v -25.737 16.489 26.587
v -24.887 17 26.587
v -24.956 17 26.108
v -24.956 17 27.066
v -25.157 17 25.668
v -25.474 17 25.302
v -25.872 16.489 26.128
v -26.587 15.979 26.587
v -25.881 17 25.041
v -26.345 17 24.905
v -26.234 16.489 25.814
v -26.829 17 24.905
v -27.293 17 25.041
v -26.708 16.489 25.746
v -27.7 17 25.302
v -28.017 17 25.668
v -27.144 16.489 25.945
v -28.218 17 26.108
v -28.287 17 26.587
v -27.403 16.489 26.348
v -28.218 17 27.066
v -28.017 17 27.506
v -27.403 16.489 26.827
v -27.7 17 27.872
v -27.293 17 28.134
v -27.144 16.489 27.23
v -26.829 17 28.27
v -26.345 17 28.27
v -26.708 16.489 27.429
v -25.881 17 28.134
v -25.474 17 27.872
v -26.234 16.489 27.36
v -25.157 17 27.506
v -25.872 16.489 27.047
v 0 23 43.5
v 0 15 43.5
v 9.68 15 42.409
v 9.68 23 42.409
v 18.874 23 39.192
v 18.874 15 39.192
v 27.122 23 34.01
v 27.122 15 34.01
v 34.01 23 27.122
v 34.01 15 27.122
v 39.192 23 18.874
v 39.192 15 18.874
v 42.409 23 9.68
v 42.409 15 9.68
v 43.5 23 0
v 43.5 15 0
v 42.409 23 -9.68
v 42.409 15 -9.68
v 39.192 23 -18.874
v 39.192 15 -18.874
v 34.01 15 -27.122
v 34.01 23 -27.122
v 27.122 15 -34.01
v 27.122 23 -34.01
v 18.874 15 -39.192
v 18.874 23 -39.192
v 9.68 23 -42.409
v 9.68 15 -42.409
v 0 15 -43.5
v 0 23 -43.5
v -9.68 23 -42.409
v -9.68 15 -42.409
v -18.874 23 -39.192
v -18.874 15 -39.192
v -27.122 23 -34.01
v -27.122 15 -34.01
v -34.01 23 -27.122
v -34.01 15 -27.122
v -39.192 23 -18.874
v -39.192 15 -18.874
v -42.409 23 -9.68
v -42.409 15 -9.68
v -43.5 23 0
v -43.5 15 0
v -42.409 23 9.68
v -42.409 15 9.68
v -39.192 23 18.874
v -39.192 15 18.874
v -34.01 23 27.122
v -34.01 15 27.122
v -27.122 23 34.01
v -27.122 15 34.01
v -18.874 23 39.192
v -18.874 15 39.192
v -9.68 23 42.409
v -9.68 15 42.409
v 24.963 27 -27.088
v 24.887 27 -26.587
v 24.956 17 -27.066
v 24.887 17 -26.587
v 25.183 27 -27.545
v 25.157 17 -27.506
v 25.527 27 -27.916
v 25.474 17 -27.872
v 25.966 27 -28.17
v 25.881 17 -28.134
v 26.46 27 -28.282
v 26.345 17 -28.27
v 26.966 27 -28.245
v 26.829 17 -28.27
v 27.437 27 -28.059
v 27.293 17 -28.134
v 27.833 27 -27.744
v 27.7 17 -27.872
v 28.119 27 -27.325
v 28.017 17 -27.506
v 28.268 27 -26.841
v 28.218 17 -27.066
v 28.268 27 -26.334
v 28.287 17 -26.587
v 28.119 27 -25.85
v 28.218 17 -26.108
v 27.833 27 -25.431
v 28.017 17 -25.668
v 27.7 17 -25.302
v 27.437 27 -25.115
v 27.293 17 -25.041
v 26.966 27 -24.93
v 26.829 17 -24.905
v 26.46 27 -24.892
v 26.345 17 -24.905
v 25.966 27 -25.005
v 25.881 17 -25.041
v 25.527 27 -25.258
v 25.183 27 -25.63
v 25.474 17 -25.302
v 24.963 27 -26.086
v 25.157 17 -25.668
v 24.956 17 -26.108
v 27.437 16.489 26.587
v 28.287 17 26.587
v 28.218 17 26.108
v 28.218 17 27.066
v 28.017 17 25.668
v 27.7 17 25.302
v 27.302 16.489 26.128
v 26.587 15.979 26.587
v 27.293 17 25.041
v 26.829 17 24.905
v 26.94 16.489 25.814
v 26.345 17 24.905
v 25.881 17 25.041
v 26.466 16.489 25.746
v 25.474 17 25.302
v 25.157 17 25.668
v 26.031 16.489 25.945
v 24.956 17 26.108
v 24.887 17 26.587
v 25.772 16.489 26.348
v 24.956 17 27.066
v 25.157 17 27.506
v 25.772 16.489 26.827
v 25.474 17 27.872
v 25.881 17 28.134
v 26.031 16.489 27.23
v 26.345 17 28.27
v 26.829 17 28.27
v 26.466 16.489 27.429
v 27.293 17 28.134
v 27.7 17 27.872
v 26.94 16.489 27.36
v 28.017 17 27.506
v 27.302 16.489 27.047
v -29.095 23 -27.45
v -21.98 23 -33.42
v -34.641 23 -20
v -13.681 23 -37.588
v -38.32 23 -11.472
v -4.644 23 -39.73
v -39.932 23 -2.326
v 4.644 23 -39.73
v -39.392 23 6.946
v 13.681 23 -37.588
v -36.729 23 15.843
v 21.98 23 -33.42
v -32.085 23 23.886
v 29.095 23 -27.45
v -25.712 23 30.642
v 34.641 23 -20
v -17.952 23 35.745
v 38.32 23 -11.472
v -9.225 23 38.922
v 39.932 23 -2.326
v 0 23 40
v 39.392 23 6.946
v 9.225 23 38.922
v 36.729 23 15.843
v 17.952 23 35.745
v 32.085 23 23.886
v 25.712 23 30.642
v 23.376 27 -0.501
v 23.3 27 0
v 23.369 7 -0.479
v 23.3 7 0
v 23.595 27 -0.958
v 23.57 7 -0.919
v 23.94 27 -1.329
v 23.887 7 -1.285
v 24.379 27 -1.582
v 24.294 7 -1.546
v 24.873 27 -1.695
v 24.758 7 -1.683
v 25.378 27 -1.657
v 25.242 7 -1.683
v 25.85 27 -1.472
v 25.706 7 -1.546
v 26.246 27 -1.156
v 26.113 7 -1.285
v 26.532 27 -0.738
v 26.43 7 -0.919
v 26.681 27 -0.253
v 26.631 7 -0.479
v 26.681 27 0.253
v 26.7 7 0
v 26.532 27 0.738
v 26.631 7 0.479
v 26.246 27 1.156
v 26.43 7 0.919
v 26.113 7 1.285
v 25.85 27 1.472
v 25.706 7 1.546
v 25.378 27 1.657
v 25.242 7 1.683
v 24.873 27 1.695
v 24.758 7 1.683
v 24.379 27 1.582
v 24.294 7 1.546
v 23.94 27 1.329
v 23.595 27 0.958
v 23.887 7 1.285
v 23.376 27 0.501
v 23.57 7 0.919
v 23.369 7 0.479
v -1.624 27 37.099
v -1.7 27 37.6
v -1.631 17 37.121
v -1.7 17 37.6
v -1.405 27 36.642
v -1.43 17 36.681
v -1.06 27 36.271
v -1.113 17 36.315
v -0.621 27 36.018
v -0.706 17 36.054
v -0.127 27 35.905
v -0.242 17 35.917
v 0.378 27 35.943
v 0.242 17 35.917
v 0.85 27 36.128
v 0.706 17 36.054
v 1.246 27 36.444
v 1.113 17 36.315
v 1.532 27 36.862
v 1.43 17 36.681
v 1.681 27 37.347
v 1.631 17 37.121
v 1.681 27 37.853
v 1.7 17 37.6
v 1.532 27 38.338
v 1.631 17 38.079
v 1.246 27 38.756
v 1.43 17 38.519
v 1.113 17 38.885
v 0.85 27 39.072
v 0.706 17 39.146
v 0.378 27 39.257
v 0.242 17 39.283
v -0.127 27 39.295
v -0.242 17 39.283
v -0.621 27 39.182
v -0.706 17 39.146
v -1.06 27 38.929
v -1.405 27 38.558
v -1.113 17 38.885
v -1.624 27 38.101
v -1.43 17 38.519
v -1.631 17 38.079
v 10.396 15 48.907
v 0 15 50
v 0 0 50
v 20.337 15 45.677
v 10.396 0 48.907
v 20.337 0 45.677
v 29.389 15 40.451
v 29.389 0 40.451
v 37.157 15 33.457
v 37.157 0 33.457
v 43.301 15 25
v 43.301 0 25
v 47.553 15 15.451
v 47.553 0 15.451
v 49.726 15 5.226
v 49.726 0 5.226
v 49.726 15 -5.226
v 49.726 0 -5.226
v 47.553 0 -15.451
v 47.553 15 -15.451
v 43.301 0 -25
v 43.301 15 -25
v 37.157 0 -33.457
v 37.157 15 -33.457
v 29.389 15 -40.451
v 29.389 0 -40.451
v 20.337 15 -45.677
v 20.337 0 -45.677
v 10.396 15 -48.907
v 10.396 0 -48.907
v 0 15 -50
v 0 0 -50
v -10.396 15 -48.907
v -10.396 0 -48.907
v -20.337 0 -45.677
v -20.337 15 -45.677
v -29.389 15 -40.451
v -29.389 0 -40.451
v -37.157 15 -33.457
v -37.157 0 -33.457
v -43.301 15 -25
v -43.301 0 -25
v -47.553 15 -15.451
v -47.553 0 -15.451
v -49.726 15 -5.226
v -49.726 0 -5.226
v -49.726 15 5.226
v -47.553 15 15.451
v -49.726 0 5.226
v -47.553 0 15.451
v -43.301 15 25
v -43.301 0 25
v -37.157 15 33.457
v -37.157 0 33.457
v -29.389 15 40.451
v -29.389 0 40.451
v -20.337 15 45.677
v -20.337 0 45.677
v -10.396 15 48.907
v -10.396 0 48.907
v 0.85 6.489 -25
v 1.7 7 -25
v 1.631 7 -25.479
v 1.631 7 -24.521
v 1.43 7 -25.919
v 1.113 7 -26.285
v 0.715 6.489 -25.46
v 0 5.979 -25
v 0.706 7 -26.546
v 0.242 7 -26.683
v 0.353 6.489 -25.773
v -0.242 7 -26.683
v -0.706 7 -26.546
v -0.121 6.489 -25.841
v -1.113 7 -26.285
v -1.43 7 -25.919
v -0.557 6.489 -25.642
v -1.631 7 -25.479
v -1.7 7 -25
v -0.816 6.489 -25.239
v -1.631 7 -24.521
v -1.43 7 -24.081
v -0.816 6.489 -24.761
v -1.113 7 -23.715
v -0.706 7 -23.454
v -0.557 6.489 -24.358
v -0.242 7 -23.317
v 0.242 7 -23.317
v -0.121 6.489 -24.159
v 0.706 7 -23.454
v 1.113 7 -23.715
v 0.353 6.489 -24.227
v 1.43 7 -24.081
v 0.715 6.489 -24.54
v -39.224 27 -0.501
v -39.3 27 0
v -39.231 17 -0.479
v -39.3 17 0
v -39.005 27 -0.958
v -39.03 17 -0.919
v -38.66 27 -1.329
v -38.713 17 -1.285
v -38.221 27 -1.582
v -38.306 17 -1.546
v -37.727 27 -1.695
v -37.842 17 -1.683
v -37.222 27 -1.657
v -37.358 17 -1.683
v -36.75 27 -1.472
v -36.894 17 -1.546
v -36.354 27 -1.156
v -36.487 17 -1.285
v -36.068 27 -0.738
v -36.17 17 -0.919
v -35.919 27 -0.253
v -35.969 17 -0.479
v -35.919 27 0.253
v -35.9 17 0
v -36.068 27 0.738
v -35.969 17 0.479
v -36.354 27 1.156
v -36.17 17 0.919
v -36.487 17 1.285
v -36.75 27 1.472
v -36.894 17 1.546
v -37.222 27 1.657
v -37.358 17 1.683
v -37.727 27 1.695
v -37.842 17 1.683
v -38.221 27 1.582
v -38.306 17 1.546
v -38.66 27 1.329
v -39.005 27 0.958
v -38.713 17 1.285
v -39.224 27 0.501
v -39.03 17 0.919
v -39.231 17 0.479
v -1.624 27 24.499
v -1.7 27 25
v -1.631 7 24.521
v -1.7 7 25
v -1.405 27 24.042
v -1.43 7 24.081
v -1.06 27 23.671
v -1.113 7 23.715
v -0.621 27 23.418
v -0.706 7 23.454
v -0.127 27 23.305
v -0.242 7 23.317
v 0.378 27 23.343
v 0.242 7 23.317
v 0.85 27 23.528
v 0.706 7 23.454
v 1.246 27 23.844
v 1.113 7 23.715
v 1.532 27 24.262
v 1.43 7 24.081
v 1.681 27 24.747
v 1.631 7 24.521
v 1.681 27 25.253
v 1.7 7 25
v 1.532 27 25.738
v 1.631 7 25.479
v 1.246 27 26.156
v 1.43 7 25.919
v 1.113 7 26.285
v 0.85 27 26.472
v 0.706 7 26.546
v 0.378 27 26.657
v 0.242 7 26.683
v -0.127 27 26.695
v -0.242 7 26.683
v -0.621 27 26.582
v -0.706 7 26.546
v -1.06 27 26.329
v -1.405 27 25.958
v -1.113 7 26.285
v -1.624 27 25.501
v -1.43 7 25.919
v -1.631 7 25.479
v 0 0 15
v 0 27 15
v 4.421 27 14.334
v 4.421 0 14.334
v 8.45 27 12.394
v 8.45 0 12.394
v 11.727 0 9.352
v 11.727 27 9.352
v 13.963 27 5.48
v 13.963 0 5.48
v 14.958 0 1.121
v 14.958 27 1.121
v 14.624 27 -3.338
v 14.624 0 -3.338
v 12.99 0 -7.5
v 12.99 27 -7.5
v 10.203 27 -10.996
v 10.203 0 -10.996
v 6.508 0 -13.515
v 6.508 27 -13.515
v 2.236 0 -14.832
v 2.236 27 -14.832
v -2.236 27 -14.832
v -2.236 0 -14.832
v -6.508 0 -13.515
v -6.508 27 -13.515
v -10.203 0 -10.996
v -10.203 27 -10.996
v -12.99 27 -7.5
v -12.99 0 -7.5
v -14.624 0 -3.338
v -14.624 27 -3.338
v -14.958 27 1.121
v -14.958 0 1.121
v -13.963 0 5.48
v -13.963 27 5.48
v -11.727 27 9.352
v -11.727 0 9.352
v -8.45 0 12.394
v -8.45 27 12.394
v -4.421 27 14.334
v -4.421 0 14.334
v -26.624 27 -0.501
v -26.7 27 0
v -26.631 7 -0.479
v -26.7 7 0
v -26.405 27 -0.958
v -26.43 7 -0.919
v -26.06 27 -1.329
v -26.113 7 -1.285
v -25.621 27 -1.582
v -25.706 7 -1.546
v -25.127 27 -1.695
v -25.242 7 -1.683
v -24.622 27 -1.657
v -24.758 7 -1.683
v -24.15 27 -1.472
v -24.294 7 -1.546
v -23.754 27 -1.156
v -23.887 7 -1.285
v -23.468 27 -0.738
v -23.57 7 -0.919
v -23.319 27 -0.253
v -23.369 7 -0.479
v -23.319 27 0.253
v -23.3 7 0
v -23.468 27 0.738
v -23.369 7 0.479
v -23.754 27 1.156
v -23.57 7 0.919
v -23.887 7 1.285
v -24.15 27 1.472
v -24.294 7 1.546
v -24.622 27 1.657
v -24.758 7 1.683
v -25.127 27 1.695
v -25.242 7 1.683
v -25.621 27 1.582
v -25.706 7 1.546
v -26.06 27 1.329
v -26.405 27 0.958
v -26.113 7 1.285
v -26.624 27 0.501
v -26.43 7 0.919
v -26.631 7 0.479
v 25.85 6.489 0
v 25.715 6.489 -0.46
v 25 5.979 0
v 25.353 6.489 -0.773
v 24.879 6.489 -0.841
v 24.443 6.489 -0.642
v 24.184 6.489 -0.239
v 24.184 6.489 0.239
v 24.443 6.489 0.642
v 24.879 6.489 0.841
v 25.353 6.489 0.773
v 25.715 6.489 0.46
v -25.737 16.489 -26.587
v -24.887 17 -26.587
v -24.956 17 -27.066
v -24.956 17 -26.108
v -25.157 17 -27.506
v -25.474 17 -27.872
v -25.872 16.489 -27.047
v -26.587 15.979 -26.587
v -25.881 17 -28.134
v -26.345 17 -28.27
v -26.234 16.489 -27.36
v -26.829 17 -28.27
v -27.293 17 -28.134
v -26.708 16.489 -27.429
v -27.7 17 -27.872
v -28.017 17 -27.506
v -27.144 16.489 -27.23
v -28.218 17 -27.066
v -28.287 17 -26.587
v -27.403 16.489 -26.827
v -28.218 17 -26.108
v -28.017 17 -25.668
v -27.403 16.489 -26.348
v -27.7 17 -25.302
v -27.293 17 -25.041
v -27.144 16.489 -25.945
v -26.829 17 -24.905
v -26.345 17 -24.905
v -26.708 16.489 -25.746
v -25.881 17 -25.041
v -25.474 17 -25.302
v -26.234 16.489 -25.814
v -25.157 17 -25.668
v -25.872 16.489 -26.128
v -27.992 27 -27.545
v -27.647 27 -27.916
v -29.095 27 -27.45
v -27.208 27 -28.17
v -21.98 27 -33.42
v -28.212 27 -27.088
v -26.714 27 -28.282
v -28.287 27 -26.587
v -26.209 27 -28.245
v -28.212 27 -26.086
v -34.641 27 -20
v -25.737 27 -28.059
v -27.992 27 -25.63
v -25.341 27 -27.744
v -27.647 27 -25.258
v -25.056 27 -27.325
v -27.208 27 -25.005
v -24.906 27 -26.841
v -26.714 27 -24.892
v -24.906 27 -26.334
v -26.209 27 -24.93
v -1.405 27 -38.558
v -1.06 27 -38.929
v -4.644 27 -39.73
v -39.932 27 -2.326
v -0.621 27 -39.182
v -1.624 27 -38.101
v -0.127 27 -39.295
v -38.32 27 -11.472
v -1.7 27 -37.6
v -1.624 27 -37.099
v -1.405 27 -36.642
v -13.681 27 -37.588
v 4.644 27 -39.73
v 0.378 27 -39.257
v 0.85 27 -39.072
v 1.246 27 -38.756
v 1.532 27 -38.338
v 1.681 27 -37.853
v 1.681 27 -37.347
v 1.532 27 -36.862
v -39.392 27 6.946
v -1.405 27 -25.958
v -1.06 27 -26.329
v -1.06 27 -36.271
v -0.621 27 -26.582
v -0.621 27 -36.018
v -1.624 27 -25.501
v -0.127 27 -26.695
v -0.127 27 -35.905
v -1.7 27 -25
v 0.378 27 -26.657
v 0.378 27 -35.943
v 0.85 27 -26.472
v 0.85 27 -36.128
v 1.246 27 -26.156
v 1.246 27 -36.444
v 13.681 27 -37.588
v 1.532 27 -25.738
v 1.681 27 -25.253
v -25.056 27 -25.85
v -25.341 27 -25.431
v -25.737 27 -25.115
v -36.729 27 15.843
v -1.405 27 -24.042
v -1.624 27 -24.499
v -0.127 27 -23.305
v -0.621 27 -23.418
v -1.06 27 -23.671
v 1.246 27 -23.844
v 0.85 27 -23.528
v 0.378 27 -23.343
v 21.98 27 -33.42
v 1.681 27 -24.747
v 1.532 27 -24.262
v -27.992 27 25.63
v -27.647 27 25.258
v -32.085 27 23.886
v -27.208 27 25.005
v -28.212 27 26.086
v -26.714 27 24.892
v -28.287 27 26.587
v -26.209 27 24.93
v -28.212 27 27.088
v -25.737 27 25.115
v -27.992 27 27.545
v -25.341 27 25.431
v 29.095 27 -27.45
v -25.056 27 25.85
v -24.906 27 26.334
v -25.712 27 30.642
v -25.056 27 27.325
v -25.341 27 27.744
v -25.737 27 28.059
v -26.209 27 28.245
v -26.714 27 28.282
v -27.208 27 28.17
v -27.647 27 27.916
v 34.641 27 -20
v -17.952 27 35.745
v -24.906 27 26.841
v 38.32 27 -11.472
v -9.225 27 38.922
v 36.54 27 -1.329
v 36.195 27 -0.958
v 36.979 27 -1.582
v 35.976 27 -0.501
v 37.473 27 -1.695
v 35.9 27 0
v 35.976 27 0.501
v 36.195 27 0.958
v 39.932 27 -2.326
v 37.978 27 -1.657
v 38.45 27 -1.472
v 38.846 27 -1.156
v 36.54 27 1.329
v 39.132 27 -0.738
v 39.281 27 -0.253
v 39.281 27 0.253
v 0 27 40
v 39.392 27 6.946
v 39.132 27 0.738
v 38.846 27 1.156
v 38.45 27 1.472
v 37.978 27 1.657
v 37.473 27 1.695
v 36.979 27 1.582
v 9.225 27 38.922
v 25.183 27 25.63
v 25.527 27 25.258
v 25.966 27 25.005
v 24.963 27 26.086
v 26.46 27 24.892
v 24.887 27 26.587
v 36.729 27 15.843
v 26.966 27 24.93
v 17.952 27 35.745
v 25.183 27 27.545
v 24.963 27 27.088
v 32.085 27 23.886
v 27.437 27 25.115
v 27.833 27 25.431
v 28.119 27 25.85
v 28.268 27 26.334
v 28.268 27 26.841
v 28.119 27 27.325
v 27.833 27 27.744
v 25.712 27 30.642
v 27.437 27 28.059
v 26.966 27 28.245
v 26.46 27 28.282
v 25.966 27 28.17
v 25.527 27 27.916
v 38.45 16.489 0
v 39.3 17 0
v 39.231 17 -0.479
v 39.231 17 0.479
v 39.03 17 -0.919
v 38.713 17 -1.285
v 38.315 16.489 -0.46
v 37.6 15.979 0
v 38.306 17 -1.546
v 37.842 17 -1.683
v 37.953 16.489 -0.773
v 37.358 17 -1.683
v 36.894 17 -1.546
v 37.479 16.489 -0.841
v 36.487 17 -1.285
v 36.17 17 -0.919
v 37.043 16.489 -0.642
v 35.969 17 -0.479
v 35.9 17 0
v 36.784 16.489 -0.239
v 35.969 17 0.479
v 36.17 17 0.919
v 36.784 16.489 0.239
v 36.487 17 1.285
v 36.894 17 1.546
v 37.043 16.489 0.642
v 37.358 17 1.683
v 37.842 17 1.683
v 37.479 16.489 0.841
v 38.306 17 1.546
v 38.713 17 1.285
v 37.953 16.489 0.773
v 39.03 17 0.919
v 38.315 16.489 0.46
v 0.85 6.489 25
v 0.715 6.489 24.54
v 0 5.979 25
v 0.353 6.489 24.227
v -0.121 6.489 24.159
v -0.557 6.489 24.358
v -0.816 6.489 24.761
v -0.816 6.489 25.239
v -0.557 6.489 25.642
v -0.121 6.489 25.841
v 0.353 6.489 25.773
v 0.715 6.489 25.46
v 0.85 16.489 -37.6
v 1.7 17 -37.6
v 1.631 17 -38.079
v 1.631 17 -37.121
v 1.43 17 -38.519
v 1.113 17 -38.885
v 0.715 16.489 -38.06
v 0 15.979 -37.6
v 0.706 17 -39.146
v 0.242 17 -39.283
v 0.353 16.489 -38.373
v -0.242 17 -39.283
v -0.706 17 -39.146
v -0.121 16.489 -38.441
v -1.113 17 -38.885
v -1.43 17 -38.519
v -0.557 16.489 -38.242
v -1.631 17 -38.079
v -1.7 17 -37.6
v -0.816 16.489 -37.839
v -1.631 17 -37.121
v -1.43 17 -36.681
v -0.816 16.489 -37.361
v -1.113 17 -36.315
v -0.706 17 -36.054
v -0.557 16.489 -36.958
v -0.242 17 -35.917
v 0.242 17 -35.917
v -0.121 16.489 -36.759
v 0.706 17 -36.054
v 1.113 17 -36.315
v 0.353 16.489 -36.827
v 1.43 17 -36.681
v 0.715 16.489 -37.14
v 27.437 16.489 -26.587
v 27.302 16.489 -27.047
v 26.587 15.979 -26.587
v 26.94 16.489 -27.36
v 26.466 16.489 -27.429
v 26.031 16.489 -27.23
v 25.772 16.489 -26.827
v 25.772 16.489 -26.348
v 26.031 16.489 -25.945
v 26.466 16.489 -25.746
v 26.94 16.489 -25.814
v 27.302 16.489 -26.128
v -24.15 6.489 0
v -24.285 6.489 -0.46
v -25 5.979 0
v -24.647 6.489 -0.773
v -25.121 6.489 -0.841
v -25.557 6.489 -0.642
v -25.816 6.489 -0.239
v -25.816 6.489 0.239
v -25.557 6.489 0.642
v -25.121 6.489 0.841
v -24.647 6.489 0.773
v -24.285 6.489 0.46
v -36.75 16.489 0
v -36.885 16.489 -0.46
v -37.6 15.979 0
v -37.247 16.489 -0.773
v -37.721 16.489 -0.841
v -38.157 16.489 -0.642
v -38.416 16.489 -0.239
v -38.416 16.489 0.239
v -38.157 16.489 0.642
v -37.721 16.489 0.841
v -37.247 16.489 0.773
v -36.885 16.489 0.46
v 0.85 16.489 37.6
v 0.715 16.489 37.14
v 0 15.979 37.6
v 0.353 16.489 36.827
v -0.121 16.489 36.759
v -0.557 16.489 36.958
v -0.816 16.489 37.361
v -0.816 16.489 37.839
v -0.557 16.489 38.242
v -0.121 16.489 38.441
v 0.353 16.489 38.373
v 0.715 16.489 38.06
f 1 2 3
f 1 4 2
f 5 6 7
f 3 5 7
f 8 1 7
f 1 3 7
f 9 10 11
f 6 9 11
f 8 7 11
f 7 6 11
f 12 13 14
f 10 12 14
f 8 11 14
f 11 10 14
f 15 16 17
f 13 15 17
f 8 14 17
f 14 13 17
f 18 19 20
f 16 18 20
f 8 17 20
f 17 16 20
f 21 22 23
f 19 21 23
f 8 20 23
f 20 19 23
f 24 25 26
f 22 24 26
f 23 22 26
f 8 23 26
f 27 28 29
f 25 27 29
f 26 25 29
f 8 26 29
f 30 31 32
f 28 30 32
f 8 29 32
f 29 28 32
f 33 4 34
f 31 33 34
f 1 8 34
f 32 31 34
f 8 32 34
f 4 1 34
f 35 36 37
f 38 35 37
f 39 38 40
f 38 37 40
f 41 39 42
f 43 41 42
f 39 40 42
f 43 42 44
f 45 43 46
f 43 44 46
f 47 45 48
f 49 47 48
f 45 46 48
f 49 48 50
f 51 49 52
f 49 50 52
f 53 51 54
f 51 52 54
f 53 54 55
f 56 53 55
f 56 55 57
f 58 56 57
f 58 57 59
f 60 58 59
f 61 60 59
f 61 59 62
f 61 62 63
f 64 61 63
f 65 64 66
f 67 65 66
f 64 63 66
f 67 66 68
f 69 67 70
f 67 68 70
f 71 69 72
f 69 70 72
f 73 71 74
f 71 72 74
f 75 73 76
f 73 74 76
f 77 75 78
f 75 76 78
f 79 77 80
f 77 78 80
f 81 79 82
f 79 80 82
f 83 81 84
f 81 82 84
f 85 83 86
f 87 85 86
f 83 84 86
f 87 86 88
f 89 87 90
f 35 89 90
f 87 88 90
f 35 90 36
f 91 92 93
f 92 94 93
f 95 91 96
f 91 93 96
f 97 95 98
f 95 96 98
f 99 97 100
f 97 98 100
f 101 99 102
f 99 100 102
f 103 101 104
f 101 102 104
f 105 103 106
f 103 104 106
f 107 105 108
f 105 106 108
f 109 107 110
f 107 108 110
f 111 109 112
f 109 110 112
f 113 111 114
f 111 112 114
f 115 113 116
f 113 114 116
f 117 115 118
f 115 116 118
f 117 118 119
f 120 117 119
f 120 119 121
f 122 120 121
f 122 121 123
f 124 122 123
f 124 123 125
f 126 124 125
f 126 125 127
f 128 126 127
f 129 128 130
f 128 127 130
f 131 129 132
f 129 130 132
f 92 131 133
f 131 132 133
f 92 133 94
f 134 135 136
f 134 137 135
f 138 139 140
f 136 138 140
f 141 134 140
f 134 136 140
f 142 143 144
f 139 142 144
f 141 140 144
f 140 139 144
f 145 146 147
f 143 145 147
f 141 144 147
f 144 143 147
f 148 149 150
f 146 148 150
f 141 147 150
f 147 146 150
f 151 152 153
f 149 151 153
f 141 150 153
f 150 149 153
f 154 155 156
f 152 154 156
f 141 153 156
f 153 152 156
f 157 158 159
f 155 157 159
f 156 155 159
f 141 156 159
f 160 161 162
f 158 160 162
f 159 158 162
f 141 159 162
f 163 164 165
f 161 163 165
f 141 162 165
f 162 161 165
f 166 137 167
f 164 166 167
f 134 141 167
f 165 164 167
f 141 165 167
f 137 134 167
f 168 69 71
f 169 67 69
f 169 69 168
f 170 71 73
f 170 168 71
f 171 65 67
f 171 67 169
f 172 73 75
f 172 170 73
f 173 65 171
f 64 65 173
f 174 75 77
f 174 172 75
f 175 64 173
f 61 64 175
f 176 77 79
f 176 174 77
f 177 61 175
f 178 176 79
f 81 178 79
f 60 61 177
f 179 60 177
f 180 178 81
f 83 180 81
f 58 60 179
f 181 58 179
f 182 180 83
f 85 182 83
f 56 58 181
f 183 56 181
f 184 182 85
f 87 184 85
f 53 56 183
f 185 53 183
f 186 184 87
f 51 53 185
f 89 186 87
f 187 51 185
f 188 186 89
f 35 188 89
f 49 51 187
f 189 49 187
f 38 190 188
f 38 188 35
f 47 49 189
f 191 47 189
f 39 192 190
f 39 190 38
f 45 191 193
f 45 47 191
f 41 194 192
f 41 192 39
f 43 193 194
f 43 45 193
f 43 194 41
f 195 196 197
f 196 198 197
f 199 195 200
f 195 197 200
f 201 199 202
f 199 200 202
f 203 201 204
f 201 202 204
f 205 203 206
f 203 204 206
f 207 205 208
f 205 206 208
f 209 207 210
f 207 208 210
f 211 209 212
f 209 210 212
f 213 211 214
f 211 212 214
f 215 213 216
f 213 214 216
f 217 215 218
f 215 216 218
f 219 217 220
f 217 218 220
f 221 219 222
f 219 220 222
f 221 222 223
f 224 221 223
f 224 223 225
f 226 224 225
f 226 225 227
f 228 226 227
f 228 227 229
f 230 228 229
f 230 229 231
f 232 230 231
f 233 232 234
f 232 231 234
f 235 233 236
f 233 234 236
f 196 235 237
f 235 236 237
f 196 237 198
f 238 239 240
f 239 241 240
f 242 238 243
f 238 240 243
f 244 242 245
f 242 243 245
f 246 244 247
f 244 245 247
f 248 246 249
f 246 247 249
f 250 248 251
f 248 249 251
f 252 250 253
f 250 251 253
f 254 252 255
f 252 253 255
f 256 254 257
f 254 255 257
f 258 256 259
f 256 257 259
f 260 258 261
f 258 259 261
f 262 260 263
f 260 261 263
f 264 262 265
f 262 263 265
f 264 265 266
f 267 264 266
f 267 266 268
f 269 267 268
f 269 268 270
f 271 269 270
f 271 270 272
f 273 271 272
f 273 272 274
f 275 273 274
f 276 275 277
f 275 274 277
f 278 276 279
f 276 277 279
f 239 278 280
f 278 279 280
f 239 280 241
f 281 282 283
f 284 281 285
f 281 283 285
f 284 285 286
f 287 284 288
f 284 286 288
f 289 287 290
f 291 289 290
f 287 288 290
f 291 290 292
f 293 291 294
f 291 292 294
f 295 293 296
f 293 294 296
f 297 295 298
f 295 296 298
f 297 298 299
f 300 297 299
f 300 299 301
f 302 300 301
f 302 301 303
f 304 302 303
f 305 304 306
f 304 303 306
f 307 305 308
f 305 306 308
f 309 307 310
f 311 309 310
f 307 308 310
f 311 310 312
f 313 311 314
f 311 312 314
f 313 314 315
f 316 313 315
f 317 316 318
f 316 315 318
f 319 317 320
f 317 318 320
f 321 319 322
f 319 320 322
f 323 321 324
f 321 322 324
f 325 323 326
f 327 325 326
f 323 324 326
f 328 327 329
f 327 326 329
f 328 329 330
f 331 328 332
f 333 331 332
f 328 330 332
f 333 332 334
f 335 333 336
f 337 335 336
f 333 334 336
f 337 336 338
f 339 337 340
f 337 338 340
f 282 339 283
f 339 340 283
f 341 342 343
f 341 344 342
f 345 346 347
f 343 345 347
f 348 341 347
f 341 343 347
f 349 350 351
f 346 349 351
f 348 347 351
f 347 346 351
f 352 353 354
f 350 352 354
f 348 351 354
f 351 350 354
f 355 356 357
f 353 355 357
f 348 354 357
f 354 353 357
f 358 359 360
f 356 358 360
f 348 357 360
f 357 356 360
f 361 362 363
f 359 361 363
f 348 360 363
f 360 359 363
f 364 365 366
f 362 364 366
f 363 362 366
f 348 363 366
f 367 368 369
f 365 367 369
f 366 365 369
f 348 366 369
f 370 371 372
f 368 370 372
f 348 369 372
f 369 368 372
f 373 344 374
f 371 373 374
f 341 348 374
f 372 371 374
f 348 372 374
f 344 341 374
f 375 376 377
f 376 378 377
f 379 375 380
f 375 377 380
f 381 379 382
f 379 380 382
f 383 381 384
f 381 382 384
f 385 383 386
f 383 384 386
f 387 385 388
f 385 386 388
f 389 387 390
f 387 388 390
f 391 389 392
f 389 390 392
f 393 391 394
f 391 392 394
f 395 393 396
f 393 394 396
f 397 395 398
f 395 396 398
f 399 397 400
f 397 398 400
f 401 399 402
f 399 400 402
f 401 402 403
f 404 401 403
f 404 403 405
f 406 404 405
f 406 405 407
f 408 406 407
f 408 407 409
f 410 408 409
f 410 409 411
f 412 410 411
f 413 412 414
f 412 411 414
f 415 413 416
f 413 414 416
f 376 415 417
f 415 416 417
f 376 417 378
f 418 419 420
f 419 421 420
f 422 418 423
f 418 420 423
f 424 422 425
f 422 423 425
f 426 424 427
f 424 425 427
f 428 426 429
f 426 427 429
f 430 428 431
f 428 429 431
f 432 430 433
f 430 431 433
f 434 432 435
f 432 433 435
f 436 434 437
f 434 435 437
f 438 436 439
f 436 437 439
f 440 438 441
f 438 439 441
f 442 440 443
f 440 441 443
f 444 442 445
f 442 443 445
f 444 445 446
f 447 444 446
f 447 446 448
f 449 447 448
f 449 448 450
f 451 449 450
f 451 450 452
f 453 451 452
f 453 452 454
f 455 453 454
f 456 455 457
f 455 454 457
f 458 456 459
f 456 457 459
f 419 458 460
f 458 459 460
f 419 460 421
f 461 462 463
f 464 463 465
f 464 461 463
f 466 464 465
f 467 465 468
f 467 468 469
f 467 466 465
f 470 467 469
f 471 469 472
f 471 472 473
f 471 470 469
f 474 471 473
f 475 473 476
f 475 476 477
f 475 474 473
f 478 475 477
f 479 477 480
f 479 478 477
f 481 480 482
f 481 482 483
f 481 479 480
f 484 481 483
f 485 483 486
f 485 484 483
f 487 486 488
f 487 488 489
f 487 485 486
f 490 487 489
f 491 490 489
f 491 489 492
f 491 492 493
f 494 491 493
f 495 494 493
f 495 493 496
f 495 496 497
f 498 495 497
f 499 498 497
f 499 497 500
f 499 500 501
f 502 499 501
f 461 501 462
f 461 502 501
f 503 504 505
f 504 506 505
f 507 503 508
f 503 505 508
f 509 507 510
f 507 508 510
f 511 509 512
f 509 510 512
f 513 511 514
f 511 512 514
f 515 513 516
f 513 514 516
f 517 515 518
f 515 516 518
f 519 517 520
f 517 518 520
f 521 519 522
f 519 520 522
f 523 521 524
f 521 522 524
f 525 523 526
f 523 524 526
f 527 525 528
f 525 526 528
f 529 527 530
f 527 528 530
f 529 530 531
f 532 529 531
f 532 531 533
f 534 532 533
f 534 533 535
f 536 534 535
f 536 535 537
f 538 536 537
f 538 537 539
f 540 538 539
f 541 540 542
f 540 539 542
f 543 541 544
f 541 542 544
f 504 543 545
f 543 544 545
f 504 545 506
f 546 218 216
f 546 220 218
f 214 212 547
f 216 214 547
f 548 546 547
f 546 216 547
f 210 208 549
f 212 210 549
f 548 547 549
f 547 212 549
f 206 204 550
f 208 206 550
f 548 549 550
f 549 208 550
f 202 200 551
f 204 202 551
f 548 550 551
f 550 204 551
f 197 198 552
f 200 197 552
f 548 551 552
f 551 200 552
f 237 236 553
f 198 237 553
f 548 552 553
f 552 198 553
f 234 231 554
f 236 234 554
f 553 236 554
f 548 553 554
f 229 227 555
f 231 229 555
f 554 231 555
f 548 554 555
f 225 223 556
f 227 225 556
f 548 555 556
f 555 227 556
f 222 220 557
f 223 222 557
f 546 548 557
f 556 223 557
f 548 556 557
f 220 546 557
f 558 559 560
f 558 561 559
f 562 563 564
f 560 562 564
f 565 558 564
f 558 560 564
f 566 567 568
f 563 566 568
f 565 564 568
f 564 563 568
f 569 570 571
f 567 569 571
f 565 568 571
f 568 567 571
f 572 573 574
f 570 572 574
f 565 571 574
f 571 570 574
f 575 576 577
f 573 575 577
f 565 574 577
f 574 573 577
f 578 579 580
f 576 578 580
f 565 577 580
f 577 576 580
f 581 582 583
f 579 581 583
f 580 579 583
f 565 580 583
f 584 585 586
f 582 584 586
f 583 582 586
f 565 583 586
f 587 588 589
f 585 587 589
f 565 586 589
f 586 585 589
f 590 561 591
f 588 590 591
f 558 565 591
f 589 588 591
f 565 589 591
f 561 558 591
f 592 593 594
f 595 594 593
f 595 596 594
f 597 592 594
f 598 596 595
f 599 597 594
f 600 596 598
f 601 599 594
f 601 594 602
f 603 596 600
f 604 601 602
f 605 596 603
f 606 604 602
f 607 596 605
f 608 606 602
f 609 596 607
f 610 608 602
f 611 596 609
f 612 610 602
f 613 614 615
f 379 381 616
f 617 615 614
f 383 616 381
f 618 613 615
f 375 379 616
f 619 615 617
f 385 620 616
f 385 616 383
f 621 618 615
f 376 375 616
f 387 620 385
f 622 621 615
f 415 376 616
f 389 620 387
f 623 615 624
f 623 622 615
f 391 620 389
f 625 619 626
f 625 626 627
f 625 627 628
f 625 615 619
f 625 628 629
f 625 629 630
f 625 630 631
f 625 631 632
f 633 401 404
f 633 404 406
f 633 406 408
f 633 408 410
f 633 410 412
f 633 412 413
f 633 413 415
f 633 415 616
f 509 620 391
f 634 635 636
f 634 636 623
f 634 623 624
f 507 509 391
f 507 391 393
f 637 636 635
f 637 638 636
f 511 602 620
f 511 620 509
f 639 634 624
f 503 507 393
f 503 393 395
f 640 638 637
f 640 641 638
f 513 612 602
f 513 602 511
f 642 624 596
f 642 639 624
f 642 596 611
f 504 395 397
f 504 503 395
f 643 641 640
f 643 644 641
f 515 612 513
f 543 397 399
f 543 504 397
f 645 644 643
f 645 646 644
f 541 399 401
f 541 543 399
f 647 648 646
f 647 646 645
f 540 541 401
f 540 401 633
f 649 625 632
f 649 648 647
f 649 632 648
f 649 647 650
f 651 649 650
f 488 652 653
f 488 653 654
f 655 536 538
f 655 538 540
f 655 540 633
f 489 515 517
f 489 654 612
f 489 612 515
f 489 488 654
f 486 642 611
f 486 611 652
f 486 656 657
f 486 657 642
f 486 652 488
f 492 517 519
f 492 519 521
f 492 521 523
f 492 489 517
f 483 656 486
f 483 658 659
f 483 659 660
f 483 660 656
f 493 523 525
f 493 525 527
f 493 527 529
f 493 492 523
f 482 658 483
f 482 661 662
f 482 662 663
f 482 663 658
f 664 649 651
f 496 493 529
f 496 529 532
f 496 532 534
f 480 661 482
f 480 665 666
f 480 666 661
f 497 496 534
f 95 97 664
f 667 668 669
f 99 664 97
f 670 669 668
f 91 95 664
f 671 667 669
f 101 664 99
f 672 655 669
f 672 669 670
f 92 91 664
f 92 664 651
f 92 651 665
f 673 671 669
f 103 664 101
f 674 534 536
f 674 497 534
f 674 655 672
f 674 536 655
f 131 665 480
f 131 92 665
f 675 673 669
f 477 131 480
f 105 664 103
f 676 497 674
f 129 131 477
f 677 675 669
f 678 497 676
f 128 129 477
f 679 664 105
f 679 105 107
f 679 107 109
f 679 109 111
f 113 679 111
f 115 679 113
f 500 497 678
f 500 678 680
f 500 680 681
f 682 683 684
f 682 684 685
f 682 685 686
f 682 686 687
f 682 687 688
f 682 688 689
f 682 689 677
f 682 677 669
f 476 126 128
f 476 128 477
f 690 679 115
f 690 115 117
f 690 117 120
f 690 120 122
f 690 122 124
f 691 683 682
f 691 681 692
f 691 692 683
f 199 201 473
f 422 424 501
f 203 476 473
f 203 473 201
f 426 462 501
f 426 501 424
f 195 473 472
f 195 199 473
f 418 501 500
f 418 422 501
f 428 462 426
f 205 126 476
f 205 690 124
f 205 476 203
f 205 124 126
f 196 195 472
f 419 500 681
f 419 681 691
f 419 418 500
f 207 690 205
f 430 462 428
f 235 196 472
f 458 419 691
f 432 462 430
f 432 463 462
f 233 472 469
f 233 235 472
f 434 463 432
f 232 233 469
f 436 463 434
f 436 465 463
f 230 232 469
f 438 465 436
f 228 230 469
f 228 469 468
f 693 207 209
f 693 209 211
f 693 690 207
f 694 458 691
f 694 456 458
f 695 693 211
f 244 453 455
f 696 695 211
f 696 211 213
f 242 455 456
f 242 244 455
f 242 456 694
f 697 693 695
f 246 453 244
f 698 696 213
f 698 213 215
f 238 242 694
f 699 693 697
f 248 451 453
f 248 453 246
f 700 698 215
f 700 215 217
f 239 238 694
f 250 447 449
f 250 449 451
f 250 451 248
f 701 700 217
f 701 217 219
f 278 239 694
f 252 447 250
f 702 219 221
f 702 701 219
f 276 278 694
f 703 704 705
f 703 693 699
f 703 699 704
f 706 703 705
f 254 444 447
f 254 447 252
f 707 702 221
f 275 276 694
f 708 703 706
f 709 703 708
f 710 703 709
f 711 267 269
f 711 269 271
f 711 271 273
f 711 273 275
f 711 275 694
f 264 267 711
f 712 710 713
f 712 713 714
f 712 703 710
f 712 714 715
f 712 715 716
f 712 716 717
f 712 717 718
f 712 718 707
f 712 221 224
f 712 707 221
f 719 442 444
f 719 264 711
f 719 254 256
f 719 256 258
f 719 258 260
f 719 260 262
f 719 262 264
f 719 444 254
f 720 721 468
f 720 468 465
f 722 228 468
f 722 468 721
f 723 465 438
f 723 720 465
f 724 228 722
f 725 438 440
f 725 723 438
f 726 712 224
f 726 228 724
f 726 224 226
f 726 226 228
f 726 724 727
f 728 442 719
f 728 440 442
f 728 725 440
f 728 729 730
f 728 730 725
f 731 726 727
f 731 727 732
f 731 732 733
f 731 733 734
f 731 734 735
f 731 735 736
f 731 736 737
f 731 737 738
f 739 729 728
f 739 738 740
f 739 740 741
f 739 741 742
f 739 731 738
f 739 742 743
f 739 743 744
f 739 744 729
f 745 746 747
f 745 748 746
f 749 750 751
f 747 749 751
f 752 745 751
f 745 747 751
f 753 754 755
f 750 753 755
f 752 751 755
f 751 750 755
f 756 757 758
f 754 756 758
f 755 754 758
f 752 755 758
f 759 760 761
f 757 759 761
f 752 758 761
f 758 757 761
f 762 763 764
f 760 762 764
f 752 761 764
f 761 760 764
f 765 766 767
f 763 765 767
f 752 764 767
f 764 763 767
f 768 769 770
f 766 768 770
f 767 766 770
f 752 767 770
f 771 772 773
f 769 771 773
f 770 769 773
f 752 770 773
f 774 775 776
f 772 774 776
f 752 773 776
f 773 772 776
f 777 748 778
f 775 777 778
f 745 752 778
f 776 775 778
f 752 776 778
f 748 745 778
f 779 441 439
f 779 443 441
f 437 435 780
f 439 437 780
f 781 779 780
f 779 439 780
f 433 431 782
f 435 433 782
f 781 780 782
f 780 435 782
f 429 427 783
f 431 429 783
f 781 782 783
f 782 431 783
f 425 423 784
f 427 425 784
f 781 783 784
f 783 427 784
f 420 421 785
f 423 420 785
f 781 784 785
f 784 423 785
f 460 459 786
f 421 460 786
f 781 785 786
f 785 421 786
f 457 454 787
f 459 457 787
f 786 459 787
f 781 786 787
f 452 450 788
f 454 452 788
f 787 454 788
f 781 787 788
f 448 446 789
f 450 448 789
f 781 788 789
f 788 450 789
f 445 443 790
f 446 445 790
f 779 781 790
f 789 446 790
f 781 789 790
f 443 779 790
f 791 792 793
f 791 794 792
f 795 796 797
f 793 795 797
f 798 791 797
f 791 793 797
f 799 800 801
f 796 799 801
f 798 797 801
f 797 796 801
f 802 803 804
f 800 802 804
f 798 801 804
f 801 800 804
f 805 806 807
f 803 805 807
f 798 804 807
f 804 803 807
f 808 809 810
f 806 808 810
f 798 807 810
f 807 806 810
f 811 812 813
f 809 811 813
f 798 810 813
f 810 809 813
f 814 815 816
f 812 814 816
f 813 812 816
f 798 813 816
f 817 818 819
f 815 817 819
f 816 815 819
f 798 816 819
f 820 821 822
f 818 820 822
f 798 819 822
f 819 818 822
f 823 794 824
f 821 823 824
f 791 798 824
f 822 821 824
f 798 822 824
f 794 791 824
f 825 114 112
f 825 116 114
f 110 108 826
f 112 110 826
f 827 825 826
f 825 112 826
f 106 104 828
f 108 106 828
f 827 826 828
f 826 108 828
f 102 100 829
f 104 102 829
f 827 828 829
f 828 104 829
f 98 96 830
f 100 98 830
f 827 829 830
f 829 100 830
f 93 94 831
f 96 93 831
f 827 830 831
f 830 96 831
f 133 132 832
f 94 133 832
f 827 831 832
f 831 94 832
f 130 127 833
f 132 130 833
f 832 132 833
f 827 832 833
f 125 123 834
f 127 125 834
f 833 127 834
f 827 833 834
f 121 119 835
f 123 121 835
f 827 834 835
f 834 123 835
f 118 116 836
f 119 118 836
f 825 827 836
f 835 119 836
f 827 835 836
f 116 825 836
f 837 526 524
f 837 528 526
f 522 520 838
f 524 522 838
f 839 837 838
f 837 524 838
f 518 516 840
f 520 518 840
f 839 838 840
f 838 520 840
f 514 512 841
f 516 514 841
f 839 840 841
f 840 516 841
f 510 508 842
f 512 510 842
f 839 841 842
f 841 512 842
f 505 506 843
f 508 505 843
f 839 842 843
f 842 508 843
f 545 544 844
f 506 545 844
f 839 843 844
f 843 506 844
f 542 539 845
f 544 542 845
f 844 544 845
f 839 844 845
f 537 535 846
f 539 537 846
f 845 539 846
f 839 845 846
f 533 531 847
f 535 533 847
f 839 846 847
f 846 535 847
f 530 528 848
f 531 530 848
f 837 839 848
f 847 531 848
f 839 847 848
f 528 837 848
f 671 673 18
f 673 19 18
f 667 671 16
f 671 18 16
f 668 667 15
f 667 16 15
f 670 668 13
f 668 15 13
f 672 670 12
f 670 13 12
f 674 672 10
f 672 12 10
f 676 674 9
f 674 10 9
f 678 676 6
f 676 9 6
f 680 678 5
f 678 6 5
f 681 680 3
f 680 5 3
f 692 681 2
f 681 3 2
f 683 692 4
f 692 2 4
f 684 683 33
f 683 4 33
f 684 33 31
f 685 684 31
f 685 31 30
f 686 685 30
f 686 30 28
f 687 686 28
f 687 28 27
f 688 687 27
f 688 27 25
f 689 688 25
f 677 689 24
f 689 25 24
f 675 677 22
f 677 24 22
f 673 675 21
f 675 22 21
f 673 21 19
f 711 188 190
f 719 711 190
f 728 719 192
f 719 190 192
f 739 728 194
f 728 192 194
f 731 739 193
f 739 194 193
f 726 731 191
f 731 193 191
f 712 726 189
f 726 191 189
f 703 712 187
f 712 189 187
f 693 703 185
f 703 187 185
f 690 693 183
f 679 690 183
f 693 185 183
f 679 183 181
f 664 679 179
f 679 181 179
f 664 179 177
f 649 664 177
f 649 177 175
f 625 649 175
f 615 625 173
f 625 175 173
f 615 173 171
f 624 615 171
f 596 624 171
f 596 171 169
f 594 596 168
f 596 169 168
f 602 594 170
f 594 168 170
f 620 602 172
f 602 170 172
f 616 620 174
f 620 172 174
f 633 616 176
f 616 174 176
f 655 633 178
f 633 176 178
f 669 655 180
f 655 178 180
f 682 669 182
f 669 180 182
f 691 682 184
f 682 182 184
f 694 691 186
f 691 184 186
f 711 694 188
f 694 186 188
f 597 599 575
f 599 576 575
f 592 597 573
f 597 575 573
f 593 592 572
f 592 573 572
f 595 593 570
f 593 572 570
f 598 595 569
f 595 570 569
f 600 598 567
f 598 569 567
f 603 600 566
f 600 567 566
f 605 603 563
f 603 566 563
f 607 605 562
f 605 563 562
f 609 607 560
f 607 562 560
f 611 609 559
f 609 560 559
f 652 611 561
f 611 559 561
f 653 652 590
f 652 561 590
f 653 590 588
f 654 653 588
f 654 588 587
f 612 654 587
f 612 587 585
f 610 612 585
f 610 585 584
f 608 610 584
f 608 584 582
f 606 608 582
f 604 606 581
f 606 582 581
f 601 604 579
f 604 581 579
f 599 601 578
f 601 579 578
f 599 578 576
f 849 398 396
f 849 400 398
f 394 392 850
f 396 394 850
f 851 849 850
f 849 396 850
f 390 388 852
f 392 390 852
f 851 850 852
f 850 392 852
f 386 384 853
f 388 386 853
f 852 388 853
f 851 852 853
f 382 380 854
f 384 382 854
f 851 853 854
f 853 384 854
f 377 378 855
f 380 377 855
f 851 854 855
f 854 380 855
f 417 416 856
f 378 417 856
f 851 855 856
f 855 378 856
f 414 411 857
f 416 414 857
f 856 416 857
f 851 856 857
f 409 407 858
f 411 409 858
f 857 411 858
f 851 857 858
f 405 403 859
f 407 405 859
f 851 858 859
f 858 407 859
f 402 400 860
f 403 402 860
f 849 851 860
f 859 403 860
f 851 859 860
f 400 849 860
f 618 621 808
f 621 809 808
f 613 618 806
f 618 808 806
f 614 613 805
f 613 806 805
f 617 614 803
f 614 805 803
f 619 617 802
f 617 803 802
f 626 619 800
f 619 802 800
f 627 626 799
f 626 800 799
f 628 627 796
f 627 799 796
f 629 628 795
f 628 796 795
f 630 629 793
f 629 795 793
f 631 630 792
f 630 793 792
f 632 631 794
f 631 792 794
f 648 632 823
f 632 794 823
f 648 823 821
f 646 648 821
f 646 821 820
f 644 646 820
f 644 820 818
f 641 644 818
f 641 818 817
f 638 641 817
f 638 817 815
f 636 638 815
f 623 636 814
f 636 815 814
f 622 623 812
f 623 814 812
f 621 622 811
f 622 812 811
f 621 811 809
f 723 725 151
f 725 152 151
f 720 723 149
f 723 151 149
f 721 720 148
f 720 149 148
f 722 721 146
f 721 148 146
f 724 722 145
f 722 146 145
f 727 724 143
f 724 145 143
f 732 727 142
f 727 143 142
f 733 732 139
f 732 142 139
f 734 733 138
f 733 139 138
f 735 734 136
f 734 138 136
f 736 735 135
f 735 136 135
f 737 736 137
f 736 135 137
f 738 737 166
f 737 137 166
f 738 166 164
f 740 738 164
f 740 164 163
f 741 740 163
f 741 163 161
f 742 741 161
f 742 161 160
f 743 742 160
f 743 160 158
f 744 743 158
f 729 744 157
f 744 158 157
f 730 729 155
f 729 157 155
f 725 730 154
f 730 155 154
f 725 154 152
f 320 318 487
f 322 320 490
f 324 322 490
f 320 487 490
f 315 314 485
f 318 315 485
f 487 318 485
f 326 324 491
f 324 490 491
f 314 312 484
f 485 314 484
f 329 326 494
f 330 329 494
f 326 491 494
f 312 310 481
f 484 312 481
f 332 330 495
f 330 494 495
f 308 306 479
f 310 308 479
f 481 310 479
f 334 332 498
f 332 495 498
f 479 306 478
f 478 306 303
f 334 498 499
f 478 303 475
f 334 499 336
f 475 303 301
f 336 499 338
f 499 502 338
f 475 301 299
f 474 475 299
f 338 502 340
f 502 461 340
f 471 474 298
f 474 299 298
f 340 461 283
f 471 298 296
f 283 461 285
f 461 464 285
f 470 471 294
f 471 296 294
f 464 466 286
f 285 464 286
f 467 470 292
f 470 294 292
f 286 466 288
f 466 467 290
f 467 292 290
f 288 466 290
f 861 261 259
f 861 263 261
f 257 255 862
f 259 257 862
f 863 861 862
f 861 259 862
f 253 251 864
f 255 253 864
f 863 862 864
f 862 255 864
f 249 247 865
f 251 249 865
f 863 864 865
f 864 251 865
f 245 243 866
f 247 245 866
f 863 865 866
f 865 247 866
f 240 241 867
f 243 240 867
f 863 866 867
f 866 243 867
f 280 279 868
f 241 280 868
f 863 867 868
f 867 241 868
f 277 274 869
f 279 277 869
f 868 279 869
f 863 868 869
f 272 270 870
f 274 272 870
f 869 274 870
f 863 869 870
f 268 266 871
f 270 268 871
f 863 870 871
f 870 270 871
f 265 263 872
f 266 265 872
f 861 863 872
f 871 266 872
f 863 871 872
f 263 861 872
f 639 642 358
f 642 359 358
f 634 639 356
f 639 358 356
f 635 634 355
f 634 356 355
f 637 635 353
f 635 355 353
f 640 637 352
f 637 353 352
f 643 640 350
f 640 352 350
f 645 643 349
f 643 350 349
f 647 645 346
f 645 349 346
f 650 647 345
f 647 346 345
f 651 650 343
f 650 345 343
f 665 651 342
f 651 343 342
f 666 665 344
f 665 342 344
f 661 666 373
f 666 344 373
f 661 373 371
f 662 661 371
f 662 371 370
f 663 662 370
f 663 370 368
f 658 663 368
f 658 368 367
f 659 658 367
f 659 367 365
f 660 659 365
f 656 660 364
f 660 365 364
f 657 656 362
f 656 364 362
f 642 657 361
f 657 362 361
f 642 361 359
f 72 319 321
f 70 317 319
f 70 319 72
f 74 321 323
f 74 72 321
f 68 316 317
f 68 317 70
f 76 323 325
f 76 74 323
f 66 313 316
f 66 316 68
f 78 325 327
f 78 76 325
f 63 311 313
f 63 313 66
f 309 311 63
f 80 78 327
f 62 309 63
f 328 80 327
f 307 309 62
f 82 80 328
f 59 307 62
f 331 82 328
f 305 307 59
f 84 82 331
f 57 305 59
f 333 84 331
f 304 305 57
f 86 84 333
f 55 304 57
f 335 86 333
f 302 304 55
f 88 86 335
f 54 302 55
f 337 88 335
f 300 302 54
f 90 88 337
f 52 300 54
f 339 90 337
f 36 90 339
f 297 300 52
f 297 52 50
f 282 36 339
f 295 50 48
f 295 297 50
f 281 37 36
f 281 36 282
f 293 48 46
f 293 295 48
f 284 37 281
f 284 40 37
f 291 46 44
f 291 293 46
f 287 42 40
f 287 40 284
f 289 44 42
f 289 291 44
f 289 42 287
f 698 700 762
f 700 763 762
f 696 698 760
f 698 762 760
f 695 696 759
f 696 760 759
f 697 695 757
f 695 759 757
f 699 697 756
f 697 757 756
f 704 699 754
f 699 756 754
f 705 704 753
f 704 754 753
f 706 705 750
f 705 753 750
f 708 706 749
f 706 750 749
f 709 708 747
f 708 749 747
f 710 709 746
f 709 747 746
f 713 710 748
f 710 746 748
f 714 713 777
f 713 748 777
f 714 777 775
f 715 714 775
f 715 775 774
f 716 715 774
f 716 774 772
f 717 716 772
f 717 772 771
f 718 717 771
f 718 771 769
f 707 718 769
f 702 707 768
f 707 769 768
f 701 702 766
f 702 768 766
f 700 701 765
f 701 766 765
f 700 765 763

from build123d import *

# Parameters (mm, degrees)
CROQUIS1_R                       = 50
CROQUIS1_R_2                     = 15
SALIENTE_EXTRUIR1_DEPTH          = 15
CROQUIS2_R                       = 43.5
CROQUIS2_R_2                     = 15
SALIENTE_EXTRUIR2_DEPTH          = 8
CROQUIS3_R                       = 40
CROQUIS3_R_2                     = 15
SALIENTE_EXTRUIR3_DEPTH          = 4
TALADRO_DE_MARGEN_PARA_M31_D     = 3.4
TALADRO_DE_MARGEN_PARA_M31_DEPTH = 10
TALADRO_DE_MARGEN_PARA_M31_TIP   = 1.021463052
TALADRO_DE_MARGEN_PARA_M32_D     = 3.4
TALADRO_DE_MARGEN_PARA_M32_DEPTH = 20
TALADRO_DE_MARGEN_PARA_M32_TIP   = 1.021463052


with BuildPart() as part:
    # Croquis1 → Saliente-Extruir1 (new body)
    with BuildSketch(Plane(origin=(0, 0, 0), x_dir=(1, 0, 0), z_dir=(0, 1, 0))):
        with Locations(Location((0, 0, 0), (0, 0, 270))):
            Circle(CROQUIS1_R)
        with Locations(Location((0, 0, 0), (0, 0, 270))):
            Circle(CROQUIS1_R_2, mode=Mode.SUBTRACT)
    extrude(amount=SALIENTE_EXTRUIR1_DEPTH)

    # Croquis2 → Saliente-Extruir2 (add)
    with BuildSketch(Plane(origin=(0, 15, 0), x_dir=(1, 0, 0), z_dir=(0, 1, 0))):
        with Locations(Location((0, 0, 0), (0, 0, 270))):
            Circle(CROQUIS2_R)
        with Locations(Location((0, 0, 0), (0, 0, 270))):
            Circle(CROQUIS2_R_2, mode=Mode.SUBTRACT)
    extrude(amount=SALIENTE_EXTRUIR2_DEPTH)

    # Croquis3 → Saliente-Extruir3 (add)
    with BuildSketch(Plane(origin=(0, 23, 0), x_dir=(1, 0, 0), z_dir=(0, 1, 0))):
        with Locations(Location((0, 0, 0), (0, 0, 270))):
            Circle(CROQUIS3_R)
        with Locations(Location((0, 0, 0), (0, 0, 270))):
            Circle(CROQUIS3_R_2, mode=Mode.SUBTRACT)
    extrude(amount=SALIENTE_EXTRUIR3_DEPTH)

    # Taladro de margen para M31
    with Locations(Plane(origin=(0, 27, 0), x_dir=(1, 0, 0), z_dir=(0, 1, 0))):
        with Locations((0, 37.6), (26.587214973, 26.587214973), (37.6, 0), (26.587214973, -26.587214973), (0, -37.6), (-26.587214973, -26.587214973), (-37.6, 0), (-26.587214973, 26.587214973)):
            Hole(TALADRO_DE_MARGEN_PARA_M31_D / 2, depth=TALADRO_DE_MARGEN_PARA_M31_DEPTH)
            with Locations((0, 0, -(TALADRO_DE_MARGEN_PARA_M31_DEPTH + TALADRO_DE_MARGEN_PARA_M31_TIP / 2))):  # 118° drill point
                Cone(0, TALADRO_DE_MARGEN_PARA_M31_D / 2, TALADRO_DE_MARGEN_PARA_M31_TIP, mode=Mode.SUBTRACT)

    # Taladro de margen para M32
    with Locations(Plane(origin=(0, 27, 0), x_dir=(1, 0, 0), z_dir=(0, 1, 0))):
        with Locations((0, 25), (25, 0), (0, -25), (-25, 0)):
            Hole(TALADRO_DE_MARGEN_PARA_M32_D / 2, depth=TALADRO_DE_MARGEN_PARA_M32_DEPTH)
            with Locations((0, 0, -(TALADRO_DE_MARGEN_PARA_M32_DEPTH + TALADRO_DE_MARGEN_PARA_M32_TIP / 2))):  # 118° drill point
                Cone(0, TALADRO_DE_MARGEN_PARA_M32_D / 2, TALADRO_DE_MARGEN_PARA_M32_TIP, mode=Mode.SUBTRACT)


solid = part.part
